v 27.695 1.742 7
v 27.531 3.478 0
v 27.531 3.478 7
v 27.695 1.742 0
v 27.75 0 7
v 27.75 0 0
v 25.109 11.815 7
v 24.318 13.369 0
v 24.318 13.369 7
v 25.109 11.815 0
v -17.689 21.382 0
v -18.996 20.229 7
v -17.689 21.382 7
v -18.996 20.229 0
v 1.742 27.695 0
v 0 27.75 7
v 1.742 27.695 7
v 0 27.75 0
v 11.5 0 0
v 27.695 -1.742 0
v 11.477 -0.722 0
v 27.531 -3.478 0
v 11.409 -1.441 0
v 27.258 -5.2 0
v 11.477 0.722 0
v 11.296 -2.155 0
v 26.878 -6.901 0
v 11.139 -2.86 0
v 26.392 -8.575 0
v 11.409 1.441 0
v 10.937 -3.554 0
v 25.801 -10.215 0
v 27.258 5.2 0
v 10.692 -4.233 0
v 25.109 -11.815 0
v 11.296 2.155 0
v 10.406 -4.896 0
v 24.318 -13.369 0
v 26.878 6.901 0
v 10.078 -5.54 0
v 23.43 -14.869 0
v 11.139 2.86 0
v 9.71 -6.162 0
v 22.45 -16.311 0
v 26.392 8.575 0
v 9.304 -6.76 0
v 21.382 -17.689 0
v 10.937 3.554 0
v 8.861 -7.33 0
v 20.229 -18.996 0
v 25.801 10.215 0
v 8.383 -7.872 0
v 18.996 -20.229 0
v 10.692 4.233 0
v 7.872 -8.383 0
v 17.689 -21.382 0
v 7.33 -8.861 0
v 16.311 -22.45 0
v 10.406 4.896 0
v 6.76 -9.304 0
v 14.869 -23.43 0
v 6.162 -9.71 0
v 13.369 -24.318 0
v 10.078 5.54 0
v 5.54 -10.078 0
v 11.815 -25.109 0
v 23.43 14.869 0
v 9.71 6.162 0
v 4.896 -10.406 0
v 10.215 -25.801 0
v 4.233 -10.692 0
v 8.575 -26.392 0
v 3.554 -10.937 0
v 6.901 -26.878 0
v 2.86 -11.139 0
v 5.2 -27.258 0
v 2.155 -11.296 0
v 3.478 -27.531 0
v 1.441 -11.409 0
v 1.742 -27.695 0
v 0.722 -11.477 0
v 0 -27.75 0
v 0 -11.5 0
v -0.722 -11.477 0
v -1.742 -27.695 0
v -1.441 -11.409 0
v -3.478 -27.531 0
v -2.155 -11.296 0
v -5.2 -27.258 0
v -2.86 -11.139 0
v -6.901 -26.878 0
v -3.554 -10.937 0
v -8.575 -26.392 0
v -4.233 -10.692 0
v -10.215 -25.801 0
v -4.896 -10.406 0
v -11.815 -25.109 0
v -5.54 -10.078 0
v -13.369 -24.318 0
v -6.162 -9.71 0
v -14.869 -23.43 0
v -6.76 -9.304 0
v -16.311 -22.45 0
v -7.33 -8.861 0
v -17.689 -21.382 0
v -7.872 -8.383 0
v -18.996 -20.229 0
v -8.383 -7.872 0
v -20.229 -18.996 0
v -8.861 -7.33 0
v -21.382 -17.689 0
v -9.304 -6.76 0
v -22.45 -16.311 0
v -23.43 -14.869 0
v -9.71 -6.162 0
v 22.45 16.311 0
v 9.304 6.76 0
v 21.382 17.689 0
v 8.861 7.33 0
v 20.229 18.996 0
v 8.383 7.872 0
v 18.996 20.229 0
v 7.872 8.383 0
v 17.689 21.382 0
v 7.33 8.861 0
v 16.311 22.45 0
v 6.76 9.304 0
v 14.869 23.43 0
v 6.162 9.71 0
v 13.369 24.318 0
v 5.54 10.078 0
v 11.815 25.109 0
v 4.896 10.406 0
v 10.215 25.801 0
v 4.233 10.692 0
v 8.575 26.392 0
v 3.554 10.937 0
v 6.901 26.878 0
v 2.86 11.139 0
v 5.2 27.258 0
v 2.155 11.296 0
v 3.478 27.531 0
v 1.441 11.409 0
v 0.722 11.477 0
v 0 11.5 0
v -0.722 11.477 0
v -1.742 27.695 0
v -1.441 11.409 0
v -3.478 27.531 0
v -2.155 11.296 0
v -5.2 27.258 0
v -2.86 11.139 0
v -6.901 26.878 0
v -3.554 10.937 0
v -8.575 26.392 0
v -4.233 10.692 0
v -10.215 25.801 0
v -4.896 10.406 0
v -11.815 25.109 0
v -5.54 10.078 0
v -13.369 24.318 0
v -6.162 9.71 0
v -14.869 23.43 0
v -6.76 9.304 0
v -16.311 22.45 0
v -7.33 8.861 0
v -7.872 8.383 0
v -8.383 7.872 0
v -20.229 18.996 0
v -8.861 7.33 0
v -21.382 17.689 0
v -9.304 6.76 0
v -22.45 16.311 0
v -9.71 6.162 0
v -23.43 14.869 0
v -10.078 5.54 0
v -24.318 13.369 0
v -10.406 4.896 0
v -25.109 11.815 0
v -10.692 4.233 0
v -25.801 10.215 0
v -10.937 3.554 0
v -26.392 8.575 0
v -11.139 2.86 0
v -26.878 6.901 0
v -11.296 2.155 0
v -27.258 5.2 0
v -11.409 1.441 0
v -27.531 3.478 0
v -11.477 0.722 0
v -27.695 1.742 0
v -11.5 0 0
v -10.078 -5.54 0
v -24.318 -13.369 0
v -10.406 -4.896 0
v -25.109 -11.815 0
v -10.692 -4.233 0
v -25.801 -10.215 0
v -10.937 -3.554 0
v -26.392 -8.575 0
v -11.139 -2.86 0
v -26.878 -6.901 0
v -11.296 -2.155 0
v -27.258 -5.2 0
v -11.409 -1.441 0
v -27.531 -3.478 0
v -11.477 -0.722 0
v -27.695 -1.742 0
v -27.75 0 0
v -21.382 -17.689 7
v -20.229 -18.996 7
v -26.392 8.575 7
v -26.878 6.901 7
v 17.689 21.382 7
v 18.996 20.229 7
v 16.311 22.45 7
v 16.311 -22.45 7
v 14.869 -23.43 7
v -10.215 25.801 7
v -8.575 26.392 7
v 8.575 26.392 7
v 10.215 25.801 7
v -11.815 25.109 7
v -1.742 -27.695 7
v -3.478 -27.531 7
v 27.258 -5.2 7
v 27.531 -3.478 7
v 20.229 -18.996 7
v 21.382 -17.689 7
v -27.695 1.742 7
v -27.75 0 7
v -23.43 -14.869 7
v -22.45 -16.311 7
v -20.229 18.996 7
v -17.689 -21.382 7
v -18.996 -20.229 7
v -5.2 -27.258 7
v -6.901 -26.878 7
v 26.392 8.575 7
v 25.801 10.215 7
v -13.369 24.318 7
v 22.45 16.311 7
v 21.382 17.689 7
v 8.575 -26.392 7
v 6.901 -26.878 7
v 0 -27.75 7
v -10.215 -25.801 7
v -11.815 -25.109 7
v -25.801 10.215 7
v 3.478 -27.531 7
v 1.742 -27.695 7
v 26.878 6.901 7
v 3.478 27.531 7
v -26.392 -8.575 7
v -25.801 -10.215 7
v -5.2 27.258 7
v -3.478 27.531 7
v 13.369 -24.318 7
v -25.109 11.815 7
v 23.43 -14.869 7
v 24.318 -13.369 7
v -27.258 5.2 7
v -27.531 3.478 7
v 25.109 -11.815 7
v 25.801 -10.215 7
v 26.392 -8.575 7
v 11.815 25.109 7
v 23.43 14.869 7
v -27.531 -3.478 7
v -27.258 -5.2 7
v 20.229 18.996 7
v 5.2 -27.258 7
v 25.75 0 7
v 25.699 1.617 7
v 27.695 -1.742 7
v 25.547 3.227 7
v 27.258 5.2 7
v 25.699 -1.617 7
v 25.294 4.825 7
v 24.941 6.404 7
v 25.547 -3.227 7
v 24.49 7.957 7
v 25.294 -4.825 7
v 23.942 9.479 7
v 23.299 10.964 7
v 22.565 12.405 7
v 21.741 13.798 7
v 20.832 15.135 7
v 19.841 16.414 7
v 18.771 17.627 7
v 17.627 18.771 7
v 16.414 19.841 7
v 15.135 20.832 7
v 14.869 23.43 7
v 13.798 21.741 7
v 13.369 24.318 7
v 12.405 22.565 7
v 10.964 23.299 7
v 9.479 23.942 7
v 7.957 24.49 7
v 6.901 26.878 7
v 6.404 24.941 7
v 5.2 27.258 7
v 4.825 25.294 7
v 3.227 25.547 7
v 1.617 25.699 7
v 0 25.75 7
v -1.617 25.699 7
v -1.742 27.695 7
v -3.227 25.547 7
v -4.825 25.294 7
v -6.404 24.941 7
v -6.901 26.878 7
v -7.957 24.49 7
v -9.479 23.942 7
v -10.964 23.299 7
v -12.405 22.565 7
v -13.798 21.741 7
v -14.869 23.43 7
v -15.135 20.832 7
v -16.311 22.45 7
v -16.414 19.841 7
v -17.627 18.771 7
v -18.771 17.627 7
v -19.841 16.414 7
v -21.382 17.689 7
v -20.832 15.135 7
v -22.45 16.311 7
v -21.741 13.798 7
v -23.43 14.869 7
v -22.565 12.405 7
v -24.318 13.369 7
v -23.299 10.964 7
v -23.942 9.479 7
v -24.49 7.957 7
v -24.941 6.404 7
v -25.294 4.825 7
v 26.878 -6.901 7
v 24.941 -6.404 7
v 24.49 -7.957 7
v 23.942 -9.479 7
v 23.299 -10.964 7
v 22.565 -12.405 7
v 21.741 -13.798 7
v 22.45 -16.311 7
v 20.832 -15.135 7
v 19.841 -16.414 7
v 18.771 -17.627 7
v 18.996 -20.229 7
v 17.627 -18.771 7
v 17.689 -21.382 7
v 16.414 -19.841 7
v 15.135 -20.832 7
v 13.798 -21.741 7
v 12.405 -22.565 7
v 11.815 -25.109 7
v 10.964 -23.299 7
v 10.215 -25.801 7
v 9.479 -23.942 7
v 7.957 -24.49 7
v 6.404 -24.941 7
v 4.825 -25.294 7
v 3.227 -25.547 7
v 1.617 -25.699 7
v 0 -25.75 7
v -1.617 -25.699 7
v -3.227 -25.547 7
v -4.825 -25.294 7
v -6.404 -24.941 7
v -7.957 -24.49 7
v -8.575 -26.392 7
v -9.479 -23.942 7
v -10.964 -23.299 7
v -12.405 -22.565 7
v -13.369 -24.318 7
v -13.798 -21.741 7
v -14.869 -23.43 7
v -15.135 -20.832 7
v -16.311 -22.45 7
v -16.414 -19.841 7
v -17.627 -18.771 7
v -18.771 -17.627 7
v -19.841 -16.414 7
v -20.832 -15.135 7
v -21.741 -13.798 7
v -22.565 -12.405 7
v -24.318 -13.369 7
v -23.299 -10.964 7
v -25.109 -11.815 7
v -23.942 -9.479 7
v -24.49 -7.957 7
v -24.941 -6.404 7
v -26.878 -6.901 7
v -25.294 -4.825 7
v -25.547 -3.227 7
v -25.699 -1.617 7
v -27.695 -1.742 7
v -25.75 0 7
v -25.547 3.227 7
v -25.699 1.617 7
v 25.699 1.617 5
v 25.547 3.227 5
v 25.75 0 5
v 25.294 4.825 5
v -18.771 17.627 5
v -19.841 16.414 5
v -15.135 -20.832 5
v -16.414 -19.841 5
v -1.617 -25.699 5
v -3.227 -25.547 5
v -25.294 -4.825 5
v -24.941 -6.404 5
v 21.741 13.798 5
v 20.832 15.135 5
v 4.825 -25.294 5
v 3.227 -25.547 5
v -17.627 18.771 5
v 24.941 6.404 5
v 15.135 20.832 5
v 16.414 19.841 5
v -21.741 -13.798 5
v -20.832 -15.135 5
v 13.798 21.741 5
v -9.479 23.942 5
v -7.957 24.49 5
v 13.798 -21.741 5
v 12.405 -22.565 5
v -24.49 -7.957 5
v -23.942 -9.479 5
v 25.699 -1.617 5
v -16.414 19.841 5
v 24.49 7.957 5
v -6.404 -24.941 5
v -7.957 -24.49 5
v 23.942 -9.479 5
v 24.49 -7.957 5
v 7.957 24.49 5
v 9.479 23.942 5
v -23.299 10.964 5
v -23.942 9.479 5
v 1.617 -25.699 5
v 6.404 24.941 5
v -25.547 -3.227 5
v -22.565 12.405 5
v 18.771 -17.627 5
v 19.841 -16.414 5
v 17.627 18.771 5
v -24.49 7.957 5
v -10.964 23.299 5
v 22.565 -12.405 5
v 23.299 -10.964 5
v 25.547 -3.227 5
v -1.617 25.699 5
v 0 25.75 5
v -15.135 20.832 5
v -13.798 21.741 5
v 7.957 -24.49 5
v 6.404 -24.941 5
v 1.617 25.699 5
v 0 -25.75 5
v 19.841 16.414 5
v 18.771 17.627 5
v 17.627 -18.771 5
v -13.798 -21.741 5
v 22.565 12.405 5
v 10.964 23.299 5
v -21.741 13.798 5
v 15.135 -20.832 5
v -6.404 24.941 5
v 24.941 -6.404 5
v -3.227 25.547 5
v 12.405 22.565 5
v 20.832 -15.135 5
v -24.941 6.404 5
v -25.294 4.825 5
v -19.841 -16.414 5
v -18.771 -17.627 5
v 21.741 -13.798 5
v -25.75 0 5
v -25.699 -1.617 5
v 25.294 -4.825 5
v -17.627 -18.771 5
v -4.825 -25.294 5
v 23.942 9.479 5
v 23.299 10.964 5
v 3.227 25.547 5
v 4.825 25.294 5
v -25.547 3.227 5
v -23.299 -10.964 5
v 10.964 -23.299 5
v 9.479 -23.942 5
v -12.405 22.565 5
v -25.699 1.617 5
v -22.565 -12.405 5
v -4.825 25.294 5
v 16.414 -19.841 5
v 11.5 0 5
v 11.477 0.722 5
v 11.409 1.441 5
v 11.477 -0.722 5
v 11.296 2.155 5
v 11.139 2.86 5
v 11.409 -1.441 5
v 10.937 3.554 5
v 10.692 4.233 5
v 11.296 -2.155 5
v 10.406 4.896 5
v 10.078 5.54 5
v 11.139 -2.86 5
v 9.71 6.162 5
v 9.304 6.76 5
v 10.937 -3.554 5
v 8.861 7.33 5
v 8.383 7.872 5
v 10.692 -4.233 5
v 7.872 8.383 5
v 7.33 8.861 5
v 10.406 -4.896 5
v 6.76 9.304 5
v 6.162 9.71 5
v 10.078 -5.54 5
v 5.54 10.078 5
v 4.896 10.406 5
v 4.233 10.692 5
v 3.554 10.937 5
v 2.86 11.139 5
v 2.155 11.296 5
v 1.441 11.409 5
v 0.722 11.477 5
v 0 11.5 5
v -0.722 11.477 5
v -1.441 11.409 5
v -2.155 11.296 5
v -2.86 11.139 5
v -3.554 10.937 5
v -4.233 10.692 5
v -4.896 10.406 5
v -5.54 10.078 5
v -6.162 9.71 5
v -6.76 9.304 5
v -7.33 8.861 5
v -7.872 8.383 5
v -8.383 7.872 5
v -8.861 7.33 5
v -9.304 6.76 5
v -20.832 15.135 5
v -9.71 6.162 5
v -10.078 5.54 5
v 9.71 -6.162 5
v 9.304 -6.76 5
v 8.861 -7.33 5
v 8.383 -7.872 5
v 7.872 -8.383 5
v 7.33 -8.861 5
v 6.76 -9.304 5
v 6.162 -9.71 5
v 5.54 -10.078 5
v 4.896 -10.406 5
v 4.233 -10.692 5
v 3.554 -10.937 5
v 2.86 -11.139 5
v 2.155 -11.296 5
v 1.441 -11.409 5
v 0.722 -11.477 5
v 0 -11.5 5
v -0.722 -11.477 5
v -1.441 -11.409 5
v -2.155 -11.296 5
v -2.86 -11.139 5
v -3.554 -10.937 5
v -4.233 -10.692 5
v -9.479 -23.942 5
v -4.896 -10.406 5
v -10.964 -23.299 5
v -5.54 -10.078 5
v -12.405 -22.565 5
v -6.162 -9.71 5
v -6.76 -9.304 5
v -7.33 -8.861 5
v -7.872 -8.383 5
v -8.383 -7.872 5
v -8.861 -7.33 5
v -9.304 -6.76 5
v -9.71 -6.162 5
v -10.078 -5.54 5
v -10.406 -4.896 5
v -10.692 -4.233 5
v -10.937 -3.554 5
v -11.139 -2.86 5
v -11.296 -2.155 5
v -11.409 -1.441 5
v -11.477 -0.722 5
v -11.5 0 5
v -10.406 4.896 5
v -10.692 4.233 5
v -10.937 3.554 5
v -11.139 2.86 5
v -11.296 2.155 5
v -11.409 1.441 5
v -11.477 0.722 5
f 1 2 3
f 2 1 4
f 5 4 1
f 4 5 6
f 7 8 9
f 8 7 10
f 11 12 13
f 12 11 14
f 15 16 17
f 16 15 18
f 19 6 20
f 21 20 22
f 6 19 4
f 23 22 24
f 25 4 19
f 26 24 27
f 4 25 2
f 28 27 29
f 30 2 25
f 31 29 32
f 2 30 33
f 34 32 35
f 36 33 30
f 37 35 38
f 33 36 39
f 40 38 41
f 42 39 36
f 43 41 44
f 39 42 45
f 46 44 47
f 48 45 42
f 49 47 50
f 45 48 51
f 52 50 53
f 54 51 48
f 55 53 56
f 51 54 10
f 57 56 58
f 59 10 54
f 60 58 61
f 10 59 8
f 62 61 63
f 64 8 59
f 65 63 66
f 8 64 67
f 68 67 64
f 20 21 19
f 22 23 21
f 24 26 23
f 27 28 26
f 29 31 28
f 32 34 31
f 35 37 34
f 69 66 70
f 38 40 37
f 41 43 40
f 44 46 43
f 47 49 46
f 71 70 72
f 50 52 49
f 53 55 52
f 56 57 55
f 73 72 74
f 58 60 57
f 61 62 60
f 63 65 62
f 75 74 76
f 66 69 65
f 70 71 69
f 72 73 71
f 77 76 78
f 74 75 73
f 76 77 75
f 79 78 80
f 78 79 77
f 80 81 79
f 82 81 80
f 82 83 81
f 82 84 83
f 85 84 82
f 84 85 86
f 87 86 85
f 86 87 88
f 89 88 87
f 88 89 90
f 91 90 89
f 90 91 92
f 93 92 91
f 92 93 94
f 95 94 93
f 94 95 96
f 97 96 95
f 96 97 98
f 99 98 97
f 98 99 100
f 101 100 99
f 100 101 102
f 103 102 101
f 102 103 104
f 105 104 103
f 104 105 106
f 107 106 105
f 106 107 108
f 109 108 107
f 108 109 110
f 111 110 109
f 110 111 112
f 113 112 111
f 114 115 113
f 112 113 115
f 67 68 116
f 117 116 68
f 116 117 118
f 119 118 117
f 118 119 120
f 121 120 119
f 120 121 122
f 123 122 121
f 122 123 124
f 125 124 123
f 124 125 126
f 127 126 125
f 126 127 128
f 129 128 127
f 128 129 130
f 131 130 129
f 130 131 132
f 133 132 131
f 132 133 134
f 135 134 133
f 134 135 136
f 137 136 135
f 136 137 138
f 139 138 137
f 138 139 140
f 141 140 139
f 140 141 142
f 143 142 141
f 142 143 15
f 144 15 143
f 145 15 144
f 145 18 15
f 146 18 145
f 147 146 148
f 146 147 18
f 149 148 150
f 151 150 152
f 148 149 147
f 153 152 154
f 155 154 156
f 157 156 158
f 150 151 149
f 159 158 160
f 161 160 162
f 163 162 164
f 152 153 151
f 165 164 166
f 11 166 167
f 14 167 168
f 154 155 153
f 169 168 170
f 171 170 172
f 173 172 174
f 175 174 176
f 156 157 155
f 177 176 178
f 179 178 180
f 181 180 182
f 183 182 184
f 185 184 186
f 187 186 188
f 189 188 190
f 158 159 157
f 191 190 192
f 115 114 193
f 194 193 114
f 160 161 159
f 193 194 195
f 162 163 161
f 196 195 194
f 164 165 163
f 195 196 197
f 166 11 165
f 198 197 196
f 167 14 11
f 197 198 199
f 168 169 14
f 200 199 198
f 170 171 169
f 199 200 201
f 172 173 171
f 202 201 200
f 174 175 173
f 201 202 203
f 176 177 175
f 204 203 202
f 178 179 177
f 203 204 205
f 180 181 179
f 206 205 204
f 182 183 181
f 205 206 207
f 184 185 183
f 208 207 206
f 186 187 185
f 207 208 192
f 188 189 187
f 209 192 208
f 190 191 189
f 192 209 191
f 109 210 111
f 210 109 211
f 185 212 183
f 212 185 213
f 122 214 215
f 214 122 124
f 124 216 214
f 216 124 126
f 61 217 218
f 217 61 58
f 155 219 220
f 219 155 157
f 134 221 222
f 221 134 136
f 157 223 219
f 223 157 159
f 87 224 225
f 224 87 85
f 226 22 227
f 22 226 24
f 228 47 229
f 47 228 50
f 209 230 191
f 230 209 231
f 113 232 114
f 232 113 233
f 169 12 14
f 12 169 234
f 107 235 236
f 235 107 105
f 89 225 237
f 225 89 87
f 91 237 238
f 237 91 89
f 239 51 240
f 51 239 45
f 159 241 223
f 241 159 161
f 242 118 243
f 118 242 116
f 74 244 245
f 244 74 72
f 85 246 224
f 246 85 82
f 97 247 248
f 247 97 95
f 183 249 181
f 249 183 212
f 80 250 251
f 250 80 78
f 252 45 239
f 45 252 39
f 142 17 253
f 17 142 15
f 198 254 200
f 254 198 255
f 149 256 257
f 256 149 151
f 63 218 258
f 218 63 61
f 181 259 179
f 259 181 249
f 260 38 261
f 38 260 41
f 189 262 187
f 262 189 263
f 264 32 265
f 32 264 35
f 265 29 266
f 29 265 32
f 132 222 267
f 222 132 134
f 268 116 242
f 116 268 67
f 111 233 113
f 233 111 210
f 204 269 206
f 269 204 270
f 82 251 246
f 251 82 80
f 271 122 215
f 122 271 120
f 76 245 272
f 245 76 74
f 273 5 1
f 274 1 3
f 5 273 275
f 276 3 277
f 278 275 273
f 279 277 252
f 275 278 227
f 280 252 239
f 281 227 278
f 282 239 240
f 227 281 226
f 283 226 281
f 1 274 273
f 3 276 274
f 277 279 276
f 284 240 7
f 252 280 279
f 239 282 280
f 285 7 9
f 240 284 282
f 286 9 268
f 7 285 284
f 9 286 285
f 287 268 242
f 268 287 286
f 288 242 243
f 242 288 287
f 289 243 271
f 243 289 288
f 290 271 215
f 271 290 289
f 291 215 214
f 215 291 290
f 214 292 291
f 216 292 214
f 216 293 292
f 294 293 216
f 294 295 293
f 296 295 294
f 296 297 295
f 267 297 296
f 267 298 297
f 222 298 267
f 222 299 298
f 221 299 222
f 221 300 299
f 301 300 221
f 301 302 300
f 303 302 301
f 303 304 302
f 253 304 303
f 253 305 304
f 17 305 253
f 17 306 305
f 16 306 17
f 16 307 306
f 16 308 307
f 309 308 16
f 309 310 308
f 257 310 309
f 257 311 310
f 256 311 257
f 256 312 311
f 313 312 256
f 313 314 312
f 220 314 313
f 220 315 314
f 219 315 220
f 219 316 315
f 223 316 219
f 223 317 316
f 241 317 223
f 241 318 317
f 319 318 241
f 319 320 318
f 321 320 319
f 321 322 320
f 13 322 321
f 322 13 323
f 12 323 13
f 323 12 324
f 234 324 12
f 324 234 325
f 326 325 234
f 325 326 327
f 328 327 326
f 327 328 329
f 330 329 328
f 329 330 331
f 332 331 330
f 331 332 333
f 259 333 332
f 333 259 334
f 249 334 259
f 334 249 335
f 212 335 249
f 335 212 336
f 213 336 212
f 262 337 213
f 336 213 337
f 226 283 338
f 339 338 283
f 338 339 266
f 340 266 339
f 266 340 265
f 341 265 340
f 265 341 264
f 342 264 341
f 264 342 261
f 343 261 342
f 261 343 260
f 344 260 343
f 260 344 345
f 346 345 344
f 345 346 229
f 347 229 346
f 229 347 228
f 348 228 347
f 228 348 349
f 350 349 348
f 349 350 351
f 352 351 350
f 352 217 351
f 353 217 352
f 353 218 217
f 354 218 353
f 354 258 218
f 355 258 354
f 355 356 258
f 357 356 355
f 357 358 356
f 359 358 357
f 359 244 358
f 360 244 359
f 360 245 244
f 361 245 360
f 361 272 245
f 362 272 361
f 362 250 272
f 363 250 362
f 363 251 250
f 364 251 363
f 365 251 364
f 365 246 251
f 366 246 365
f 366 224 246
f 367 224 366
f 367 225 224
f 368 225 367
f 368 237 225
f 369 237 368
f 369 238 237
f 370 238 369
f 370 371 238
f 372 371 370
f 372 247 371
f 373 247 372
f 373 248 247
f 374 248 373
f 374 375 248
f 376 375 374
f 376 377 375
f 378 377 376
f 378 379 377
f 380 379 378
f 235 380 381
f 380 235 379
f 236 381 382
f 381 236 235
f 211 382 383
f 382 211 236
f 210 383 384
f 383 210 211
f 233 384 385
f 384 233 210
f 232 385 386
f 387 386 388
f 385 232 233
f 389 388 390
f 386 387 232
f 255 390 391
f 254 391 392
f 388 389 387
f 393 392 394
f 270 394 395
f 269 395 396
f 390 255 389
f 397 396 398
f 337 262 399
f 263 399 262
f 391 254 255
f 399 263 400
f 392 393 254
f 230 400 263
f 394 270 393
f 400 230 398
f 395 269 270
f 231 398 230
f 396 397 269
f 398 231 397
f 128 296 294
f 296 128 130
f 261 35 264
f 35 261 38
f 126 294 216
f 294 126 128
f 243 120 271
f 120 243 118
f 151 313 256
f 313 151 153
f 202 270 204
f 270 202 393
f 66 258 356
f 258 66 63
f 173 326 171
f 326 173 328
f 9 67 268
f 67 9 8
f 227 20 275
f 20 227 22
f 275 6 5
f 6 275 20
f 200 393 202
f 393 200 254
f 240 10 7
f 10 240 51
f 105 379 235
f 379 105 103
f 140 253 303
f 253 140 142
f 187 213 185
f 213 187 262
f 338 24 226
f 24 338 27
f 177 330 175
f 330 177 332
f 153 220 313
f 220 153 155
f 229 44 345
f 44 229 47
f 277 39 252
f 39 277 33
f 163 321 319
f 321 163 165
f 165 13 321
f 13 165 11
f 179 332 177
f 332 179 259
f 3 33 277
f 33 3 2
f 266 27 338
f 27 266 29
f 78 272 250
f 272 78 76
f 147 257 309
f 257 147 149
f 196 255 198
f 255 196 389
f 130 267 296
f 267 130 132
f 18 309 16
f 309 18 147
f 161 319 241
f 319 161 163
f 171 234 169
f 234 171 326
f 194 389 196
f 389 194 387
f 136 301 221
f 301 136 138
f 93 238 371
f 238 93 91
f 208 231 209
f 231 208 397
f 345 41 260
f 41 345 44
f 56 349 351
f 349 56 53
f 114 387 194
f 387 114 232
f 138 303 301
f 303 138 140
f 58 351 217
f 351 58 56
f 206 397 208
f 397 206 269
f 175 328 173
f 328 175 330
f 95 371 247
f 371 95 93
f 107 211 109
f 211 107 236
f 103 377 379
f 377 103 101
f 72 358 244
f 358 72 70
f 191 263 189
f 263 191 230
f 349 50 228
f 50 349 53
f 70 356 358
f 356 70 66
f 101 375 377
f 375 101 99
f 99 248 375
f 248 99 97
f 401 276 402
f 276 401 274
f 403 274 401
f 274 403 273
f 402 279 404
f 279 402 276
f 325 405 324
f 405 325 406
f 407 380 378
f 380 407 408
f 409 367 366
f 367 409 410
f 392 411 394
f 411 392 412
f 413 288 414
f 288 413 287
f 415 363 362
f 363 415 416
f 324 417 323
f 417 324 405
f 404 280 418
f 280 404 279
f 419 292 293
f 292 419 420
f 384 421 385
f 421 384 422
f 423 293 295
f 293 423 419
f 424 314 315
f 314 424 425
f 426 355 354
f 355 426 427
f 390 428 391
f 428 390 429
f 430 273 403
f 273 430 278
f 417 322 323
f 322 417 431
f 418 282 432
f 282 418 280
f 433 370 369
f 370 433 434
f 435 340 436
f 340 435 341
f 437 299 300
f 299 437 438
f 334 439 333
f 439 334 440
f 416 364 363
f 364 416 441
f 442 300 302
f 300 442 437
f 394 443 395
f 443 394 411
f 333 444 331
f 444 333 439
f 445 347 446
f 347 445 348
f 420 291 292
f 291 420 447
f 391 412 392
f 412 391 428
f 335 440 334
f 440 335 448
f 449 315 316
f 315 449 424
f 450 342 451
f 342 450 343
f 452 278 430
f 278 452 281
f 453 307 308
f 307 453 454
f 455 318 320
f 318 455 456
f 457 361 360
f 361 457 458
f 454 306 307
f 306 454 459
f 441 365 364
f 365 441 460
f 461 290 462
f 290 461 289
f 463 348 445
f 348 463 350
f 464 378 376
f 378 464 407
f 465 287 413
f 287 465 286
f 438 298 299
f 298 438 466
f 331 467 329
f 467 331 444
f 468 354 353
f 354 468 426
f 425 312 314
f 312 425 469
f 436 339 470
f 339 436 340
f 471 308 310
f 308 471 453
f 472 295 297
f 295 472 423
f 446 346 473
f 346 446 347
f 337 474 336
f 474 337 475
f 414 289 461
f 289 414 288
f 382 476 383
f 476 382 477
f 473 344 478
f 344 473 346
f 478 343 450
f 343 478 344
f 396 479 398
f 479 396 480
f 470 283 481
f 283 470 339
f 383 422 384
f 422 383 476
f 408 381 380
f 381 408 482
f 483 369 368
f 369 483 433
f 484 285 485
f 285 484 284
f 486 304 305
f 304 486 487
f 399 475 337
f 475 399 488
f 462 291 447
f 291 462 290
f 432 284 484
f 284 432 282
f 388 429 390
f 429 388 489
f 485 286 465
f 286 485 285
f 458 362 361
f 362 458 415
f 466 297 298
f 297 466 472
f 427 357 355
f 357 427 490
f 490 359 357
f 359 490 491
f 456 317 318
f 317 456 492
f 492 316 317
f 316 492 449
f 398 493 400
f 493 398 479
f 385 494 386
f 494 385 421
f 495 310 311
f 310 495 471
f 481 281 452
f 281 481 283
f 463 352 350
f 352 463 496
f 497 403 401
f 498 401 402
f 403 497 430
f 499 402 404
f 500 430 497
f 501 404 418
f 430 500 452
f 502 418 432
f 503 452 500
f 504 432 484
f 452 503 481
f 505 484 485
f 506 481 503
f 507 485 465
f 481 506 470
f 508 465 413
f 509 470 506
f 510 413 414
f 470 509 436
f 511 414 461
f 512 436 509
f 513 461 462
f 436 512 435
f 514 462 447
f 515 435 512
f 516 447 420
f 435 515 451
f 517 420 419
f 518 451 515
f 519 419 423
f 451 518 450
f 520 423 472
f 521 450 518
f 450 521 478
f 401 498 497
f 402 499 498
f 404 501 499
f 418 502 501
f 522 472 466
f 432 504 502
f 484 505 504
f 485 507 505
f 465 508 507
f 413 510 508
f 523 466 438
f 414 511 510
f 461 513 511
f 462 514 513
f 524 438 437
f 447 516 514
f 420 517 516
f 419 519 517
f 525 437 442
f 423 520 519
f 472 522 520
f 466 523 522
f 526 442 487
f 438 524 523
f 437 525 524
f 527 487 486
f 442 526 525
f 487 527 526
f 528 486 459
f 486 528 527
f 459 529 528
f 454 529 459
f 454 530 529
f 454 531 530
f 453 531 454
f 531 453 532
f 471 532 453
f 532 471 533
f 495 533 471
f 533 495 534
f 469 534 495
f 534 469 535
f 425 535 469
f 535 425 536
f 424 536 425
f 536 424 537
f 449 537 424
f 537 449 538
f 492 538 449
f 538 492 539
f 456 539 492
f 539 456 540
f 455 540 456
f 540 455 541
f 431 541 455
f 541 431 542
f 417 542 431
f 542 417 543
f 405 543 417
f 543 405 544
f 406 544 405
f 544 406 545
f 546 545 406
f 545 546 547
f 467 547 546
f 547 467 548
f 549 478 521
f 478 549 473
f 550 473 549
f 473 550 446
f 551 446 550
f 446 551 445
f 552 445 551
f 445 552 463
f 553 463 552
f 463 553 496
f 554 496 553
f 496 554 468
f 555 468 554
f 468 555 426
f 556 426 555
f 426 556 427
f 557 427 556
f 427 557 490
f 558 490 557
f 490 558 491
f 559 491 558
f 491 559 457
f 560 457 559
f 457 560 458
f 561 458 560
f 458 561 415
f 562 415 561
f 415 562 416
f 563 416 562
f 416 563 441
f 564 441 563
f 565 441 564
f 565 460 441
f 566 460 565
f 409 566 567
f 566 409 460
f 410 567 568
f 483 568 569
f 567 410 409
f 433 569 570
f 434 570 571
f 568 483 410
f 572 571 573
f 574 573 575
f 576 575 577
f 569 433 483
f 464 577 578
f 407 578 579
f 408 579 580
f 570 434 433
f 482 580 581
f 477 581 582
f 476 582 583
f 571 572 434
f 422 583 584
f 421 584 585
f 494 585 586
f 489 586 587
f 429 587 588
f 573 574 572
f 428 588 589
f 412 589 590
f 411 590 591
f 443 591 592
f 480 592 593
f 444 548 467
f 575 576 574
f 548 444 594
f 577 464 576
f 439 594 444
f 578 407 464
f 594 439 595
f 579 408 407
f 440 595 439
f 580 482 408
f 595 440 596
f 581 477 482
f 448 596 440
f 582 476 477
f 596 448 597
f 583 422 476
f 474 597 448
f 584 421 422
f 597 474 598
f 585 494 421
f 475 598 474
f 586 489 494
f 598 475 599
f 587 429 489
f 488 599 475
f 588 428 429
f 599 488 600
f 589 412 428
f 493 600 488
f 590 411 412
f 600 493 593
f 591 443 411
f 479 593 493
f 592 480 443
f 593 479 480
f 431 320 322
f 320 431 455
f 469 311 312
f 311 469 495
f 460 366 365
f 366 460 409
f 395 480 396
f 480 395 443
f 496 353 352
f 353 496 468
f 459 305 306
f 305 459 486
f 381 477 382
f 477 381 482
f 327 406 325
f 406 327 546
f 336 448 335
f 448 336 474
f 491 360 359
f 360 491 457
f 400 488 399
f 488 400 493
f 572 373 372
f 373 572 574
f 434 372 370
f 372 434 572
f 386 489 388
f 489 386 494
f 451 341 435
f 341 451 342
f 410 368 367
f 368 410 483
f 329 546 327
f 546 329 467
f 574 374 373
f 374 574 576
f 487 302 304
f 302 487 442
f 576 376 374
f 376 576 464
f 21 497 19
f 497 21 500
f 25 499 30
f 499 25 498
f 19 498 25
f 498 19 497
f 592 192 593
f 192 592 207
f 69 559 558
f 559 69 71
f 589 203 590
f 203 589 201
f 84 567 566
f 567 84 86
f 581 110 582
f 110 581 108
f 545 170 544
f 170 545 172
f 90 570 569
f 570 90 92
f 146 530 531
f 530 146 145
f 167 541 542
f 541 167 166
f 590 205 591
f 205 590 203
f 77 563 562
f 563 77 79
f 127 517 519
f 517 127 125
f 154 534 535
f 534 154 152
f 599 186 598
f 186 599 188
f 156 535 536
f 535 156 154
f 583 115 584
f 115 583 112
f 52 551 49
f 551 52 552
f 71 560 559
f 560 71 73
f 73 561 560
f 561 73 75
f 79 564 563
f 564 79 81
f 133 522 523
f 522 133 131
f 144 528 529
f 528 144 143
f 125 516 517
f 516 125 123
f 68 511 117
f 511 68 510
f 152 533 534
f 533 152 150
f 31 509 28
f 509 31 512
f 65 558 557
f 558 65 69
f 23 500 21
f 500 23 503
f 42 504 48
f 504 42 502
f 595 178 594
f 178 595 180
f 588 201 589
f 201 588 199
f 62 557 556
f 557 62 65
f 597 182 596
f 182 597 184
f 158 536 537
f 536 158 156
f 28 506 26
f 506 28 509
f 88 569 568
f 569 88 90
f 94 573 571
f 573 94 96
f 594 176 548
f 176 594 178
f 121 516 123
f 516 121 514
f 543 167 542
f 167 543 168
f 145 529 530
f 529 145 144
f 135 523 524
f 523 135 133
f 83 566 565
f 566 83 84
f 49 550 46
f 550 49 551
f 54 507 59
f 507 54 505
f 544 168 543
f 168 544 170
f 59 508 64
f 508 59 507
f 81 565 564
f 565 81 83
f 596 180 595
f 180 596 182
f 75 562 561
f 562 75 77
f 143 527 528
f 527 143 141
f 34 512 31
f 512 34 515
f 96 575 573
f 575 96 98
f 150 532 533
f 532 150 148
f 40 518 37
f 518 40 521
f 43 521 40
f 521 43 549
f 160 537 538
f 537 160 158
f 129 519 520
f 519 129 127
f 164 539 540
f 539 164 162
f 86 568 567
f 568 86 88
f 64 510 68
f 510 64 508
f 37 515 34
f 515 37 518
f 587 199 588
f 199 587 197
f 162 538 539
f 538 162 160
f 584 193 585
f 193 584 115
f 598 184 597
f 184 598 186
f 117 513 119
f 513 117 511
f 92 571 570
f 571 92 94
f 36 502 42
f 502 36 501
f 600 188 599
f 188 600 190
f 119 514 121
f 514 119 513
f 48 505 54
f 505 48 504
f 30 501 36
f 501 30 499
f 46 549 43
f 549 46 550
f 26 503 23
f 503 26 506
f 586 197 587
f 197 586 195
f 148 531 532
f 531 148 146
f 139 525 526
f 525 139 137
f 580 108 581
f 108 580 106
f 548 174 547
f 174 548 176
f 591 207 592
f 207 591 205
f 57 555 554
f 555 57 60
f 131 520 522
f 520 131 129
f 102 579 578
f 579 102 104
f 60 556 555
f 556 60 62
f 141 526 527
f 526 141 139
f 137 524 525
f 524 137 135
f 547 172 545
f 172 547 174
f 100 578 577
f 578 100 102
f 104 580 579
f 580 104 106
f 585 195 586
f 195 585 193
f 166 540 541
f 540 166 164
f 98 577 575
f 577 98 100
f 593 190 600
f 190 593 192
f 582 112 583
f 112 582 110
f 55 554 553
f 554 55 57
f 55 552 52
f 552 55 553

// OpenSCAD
lensDepth = 2;
goProDepth = 5;
lensWidth = 51.5;
goProWidth = 23;
margin = 2;

difference(){
	cylinder(lensDepth+goProDepth, r=lensWidth/2+margin, $fn=100);
	translate([0,0,goProDepth]) cylinder(h=200, r=lensWidth/2, $fn=100);
	translate([0,0,-1]) cylinder(h=200, r=goProWidth/2, $fn=100);

}
